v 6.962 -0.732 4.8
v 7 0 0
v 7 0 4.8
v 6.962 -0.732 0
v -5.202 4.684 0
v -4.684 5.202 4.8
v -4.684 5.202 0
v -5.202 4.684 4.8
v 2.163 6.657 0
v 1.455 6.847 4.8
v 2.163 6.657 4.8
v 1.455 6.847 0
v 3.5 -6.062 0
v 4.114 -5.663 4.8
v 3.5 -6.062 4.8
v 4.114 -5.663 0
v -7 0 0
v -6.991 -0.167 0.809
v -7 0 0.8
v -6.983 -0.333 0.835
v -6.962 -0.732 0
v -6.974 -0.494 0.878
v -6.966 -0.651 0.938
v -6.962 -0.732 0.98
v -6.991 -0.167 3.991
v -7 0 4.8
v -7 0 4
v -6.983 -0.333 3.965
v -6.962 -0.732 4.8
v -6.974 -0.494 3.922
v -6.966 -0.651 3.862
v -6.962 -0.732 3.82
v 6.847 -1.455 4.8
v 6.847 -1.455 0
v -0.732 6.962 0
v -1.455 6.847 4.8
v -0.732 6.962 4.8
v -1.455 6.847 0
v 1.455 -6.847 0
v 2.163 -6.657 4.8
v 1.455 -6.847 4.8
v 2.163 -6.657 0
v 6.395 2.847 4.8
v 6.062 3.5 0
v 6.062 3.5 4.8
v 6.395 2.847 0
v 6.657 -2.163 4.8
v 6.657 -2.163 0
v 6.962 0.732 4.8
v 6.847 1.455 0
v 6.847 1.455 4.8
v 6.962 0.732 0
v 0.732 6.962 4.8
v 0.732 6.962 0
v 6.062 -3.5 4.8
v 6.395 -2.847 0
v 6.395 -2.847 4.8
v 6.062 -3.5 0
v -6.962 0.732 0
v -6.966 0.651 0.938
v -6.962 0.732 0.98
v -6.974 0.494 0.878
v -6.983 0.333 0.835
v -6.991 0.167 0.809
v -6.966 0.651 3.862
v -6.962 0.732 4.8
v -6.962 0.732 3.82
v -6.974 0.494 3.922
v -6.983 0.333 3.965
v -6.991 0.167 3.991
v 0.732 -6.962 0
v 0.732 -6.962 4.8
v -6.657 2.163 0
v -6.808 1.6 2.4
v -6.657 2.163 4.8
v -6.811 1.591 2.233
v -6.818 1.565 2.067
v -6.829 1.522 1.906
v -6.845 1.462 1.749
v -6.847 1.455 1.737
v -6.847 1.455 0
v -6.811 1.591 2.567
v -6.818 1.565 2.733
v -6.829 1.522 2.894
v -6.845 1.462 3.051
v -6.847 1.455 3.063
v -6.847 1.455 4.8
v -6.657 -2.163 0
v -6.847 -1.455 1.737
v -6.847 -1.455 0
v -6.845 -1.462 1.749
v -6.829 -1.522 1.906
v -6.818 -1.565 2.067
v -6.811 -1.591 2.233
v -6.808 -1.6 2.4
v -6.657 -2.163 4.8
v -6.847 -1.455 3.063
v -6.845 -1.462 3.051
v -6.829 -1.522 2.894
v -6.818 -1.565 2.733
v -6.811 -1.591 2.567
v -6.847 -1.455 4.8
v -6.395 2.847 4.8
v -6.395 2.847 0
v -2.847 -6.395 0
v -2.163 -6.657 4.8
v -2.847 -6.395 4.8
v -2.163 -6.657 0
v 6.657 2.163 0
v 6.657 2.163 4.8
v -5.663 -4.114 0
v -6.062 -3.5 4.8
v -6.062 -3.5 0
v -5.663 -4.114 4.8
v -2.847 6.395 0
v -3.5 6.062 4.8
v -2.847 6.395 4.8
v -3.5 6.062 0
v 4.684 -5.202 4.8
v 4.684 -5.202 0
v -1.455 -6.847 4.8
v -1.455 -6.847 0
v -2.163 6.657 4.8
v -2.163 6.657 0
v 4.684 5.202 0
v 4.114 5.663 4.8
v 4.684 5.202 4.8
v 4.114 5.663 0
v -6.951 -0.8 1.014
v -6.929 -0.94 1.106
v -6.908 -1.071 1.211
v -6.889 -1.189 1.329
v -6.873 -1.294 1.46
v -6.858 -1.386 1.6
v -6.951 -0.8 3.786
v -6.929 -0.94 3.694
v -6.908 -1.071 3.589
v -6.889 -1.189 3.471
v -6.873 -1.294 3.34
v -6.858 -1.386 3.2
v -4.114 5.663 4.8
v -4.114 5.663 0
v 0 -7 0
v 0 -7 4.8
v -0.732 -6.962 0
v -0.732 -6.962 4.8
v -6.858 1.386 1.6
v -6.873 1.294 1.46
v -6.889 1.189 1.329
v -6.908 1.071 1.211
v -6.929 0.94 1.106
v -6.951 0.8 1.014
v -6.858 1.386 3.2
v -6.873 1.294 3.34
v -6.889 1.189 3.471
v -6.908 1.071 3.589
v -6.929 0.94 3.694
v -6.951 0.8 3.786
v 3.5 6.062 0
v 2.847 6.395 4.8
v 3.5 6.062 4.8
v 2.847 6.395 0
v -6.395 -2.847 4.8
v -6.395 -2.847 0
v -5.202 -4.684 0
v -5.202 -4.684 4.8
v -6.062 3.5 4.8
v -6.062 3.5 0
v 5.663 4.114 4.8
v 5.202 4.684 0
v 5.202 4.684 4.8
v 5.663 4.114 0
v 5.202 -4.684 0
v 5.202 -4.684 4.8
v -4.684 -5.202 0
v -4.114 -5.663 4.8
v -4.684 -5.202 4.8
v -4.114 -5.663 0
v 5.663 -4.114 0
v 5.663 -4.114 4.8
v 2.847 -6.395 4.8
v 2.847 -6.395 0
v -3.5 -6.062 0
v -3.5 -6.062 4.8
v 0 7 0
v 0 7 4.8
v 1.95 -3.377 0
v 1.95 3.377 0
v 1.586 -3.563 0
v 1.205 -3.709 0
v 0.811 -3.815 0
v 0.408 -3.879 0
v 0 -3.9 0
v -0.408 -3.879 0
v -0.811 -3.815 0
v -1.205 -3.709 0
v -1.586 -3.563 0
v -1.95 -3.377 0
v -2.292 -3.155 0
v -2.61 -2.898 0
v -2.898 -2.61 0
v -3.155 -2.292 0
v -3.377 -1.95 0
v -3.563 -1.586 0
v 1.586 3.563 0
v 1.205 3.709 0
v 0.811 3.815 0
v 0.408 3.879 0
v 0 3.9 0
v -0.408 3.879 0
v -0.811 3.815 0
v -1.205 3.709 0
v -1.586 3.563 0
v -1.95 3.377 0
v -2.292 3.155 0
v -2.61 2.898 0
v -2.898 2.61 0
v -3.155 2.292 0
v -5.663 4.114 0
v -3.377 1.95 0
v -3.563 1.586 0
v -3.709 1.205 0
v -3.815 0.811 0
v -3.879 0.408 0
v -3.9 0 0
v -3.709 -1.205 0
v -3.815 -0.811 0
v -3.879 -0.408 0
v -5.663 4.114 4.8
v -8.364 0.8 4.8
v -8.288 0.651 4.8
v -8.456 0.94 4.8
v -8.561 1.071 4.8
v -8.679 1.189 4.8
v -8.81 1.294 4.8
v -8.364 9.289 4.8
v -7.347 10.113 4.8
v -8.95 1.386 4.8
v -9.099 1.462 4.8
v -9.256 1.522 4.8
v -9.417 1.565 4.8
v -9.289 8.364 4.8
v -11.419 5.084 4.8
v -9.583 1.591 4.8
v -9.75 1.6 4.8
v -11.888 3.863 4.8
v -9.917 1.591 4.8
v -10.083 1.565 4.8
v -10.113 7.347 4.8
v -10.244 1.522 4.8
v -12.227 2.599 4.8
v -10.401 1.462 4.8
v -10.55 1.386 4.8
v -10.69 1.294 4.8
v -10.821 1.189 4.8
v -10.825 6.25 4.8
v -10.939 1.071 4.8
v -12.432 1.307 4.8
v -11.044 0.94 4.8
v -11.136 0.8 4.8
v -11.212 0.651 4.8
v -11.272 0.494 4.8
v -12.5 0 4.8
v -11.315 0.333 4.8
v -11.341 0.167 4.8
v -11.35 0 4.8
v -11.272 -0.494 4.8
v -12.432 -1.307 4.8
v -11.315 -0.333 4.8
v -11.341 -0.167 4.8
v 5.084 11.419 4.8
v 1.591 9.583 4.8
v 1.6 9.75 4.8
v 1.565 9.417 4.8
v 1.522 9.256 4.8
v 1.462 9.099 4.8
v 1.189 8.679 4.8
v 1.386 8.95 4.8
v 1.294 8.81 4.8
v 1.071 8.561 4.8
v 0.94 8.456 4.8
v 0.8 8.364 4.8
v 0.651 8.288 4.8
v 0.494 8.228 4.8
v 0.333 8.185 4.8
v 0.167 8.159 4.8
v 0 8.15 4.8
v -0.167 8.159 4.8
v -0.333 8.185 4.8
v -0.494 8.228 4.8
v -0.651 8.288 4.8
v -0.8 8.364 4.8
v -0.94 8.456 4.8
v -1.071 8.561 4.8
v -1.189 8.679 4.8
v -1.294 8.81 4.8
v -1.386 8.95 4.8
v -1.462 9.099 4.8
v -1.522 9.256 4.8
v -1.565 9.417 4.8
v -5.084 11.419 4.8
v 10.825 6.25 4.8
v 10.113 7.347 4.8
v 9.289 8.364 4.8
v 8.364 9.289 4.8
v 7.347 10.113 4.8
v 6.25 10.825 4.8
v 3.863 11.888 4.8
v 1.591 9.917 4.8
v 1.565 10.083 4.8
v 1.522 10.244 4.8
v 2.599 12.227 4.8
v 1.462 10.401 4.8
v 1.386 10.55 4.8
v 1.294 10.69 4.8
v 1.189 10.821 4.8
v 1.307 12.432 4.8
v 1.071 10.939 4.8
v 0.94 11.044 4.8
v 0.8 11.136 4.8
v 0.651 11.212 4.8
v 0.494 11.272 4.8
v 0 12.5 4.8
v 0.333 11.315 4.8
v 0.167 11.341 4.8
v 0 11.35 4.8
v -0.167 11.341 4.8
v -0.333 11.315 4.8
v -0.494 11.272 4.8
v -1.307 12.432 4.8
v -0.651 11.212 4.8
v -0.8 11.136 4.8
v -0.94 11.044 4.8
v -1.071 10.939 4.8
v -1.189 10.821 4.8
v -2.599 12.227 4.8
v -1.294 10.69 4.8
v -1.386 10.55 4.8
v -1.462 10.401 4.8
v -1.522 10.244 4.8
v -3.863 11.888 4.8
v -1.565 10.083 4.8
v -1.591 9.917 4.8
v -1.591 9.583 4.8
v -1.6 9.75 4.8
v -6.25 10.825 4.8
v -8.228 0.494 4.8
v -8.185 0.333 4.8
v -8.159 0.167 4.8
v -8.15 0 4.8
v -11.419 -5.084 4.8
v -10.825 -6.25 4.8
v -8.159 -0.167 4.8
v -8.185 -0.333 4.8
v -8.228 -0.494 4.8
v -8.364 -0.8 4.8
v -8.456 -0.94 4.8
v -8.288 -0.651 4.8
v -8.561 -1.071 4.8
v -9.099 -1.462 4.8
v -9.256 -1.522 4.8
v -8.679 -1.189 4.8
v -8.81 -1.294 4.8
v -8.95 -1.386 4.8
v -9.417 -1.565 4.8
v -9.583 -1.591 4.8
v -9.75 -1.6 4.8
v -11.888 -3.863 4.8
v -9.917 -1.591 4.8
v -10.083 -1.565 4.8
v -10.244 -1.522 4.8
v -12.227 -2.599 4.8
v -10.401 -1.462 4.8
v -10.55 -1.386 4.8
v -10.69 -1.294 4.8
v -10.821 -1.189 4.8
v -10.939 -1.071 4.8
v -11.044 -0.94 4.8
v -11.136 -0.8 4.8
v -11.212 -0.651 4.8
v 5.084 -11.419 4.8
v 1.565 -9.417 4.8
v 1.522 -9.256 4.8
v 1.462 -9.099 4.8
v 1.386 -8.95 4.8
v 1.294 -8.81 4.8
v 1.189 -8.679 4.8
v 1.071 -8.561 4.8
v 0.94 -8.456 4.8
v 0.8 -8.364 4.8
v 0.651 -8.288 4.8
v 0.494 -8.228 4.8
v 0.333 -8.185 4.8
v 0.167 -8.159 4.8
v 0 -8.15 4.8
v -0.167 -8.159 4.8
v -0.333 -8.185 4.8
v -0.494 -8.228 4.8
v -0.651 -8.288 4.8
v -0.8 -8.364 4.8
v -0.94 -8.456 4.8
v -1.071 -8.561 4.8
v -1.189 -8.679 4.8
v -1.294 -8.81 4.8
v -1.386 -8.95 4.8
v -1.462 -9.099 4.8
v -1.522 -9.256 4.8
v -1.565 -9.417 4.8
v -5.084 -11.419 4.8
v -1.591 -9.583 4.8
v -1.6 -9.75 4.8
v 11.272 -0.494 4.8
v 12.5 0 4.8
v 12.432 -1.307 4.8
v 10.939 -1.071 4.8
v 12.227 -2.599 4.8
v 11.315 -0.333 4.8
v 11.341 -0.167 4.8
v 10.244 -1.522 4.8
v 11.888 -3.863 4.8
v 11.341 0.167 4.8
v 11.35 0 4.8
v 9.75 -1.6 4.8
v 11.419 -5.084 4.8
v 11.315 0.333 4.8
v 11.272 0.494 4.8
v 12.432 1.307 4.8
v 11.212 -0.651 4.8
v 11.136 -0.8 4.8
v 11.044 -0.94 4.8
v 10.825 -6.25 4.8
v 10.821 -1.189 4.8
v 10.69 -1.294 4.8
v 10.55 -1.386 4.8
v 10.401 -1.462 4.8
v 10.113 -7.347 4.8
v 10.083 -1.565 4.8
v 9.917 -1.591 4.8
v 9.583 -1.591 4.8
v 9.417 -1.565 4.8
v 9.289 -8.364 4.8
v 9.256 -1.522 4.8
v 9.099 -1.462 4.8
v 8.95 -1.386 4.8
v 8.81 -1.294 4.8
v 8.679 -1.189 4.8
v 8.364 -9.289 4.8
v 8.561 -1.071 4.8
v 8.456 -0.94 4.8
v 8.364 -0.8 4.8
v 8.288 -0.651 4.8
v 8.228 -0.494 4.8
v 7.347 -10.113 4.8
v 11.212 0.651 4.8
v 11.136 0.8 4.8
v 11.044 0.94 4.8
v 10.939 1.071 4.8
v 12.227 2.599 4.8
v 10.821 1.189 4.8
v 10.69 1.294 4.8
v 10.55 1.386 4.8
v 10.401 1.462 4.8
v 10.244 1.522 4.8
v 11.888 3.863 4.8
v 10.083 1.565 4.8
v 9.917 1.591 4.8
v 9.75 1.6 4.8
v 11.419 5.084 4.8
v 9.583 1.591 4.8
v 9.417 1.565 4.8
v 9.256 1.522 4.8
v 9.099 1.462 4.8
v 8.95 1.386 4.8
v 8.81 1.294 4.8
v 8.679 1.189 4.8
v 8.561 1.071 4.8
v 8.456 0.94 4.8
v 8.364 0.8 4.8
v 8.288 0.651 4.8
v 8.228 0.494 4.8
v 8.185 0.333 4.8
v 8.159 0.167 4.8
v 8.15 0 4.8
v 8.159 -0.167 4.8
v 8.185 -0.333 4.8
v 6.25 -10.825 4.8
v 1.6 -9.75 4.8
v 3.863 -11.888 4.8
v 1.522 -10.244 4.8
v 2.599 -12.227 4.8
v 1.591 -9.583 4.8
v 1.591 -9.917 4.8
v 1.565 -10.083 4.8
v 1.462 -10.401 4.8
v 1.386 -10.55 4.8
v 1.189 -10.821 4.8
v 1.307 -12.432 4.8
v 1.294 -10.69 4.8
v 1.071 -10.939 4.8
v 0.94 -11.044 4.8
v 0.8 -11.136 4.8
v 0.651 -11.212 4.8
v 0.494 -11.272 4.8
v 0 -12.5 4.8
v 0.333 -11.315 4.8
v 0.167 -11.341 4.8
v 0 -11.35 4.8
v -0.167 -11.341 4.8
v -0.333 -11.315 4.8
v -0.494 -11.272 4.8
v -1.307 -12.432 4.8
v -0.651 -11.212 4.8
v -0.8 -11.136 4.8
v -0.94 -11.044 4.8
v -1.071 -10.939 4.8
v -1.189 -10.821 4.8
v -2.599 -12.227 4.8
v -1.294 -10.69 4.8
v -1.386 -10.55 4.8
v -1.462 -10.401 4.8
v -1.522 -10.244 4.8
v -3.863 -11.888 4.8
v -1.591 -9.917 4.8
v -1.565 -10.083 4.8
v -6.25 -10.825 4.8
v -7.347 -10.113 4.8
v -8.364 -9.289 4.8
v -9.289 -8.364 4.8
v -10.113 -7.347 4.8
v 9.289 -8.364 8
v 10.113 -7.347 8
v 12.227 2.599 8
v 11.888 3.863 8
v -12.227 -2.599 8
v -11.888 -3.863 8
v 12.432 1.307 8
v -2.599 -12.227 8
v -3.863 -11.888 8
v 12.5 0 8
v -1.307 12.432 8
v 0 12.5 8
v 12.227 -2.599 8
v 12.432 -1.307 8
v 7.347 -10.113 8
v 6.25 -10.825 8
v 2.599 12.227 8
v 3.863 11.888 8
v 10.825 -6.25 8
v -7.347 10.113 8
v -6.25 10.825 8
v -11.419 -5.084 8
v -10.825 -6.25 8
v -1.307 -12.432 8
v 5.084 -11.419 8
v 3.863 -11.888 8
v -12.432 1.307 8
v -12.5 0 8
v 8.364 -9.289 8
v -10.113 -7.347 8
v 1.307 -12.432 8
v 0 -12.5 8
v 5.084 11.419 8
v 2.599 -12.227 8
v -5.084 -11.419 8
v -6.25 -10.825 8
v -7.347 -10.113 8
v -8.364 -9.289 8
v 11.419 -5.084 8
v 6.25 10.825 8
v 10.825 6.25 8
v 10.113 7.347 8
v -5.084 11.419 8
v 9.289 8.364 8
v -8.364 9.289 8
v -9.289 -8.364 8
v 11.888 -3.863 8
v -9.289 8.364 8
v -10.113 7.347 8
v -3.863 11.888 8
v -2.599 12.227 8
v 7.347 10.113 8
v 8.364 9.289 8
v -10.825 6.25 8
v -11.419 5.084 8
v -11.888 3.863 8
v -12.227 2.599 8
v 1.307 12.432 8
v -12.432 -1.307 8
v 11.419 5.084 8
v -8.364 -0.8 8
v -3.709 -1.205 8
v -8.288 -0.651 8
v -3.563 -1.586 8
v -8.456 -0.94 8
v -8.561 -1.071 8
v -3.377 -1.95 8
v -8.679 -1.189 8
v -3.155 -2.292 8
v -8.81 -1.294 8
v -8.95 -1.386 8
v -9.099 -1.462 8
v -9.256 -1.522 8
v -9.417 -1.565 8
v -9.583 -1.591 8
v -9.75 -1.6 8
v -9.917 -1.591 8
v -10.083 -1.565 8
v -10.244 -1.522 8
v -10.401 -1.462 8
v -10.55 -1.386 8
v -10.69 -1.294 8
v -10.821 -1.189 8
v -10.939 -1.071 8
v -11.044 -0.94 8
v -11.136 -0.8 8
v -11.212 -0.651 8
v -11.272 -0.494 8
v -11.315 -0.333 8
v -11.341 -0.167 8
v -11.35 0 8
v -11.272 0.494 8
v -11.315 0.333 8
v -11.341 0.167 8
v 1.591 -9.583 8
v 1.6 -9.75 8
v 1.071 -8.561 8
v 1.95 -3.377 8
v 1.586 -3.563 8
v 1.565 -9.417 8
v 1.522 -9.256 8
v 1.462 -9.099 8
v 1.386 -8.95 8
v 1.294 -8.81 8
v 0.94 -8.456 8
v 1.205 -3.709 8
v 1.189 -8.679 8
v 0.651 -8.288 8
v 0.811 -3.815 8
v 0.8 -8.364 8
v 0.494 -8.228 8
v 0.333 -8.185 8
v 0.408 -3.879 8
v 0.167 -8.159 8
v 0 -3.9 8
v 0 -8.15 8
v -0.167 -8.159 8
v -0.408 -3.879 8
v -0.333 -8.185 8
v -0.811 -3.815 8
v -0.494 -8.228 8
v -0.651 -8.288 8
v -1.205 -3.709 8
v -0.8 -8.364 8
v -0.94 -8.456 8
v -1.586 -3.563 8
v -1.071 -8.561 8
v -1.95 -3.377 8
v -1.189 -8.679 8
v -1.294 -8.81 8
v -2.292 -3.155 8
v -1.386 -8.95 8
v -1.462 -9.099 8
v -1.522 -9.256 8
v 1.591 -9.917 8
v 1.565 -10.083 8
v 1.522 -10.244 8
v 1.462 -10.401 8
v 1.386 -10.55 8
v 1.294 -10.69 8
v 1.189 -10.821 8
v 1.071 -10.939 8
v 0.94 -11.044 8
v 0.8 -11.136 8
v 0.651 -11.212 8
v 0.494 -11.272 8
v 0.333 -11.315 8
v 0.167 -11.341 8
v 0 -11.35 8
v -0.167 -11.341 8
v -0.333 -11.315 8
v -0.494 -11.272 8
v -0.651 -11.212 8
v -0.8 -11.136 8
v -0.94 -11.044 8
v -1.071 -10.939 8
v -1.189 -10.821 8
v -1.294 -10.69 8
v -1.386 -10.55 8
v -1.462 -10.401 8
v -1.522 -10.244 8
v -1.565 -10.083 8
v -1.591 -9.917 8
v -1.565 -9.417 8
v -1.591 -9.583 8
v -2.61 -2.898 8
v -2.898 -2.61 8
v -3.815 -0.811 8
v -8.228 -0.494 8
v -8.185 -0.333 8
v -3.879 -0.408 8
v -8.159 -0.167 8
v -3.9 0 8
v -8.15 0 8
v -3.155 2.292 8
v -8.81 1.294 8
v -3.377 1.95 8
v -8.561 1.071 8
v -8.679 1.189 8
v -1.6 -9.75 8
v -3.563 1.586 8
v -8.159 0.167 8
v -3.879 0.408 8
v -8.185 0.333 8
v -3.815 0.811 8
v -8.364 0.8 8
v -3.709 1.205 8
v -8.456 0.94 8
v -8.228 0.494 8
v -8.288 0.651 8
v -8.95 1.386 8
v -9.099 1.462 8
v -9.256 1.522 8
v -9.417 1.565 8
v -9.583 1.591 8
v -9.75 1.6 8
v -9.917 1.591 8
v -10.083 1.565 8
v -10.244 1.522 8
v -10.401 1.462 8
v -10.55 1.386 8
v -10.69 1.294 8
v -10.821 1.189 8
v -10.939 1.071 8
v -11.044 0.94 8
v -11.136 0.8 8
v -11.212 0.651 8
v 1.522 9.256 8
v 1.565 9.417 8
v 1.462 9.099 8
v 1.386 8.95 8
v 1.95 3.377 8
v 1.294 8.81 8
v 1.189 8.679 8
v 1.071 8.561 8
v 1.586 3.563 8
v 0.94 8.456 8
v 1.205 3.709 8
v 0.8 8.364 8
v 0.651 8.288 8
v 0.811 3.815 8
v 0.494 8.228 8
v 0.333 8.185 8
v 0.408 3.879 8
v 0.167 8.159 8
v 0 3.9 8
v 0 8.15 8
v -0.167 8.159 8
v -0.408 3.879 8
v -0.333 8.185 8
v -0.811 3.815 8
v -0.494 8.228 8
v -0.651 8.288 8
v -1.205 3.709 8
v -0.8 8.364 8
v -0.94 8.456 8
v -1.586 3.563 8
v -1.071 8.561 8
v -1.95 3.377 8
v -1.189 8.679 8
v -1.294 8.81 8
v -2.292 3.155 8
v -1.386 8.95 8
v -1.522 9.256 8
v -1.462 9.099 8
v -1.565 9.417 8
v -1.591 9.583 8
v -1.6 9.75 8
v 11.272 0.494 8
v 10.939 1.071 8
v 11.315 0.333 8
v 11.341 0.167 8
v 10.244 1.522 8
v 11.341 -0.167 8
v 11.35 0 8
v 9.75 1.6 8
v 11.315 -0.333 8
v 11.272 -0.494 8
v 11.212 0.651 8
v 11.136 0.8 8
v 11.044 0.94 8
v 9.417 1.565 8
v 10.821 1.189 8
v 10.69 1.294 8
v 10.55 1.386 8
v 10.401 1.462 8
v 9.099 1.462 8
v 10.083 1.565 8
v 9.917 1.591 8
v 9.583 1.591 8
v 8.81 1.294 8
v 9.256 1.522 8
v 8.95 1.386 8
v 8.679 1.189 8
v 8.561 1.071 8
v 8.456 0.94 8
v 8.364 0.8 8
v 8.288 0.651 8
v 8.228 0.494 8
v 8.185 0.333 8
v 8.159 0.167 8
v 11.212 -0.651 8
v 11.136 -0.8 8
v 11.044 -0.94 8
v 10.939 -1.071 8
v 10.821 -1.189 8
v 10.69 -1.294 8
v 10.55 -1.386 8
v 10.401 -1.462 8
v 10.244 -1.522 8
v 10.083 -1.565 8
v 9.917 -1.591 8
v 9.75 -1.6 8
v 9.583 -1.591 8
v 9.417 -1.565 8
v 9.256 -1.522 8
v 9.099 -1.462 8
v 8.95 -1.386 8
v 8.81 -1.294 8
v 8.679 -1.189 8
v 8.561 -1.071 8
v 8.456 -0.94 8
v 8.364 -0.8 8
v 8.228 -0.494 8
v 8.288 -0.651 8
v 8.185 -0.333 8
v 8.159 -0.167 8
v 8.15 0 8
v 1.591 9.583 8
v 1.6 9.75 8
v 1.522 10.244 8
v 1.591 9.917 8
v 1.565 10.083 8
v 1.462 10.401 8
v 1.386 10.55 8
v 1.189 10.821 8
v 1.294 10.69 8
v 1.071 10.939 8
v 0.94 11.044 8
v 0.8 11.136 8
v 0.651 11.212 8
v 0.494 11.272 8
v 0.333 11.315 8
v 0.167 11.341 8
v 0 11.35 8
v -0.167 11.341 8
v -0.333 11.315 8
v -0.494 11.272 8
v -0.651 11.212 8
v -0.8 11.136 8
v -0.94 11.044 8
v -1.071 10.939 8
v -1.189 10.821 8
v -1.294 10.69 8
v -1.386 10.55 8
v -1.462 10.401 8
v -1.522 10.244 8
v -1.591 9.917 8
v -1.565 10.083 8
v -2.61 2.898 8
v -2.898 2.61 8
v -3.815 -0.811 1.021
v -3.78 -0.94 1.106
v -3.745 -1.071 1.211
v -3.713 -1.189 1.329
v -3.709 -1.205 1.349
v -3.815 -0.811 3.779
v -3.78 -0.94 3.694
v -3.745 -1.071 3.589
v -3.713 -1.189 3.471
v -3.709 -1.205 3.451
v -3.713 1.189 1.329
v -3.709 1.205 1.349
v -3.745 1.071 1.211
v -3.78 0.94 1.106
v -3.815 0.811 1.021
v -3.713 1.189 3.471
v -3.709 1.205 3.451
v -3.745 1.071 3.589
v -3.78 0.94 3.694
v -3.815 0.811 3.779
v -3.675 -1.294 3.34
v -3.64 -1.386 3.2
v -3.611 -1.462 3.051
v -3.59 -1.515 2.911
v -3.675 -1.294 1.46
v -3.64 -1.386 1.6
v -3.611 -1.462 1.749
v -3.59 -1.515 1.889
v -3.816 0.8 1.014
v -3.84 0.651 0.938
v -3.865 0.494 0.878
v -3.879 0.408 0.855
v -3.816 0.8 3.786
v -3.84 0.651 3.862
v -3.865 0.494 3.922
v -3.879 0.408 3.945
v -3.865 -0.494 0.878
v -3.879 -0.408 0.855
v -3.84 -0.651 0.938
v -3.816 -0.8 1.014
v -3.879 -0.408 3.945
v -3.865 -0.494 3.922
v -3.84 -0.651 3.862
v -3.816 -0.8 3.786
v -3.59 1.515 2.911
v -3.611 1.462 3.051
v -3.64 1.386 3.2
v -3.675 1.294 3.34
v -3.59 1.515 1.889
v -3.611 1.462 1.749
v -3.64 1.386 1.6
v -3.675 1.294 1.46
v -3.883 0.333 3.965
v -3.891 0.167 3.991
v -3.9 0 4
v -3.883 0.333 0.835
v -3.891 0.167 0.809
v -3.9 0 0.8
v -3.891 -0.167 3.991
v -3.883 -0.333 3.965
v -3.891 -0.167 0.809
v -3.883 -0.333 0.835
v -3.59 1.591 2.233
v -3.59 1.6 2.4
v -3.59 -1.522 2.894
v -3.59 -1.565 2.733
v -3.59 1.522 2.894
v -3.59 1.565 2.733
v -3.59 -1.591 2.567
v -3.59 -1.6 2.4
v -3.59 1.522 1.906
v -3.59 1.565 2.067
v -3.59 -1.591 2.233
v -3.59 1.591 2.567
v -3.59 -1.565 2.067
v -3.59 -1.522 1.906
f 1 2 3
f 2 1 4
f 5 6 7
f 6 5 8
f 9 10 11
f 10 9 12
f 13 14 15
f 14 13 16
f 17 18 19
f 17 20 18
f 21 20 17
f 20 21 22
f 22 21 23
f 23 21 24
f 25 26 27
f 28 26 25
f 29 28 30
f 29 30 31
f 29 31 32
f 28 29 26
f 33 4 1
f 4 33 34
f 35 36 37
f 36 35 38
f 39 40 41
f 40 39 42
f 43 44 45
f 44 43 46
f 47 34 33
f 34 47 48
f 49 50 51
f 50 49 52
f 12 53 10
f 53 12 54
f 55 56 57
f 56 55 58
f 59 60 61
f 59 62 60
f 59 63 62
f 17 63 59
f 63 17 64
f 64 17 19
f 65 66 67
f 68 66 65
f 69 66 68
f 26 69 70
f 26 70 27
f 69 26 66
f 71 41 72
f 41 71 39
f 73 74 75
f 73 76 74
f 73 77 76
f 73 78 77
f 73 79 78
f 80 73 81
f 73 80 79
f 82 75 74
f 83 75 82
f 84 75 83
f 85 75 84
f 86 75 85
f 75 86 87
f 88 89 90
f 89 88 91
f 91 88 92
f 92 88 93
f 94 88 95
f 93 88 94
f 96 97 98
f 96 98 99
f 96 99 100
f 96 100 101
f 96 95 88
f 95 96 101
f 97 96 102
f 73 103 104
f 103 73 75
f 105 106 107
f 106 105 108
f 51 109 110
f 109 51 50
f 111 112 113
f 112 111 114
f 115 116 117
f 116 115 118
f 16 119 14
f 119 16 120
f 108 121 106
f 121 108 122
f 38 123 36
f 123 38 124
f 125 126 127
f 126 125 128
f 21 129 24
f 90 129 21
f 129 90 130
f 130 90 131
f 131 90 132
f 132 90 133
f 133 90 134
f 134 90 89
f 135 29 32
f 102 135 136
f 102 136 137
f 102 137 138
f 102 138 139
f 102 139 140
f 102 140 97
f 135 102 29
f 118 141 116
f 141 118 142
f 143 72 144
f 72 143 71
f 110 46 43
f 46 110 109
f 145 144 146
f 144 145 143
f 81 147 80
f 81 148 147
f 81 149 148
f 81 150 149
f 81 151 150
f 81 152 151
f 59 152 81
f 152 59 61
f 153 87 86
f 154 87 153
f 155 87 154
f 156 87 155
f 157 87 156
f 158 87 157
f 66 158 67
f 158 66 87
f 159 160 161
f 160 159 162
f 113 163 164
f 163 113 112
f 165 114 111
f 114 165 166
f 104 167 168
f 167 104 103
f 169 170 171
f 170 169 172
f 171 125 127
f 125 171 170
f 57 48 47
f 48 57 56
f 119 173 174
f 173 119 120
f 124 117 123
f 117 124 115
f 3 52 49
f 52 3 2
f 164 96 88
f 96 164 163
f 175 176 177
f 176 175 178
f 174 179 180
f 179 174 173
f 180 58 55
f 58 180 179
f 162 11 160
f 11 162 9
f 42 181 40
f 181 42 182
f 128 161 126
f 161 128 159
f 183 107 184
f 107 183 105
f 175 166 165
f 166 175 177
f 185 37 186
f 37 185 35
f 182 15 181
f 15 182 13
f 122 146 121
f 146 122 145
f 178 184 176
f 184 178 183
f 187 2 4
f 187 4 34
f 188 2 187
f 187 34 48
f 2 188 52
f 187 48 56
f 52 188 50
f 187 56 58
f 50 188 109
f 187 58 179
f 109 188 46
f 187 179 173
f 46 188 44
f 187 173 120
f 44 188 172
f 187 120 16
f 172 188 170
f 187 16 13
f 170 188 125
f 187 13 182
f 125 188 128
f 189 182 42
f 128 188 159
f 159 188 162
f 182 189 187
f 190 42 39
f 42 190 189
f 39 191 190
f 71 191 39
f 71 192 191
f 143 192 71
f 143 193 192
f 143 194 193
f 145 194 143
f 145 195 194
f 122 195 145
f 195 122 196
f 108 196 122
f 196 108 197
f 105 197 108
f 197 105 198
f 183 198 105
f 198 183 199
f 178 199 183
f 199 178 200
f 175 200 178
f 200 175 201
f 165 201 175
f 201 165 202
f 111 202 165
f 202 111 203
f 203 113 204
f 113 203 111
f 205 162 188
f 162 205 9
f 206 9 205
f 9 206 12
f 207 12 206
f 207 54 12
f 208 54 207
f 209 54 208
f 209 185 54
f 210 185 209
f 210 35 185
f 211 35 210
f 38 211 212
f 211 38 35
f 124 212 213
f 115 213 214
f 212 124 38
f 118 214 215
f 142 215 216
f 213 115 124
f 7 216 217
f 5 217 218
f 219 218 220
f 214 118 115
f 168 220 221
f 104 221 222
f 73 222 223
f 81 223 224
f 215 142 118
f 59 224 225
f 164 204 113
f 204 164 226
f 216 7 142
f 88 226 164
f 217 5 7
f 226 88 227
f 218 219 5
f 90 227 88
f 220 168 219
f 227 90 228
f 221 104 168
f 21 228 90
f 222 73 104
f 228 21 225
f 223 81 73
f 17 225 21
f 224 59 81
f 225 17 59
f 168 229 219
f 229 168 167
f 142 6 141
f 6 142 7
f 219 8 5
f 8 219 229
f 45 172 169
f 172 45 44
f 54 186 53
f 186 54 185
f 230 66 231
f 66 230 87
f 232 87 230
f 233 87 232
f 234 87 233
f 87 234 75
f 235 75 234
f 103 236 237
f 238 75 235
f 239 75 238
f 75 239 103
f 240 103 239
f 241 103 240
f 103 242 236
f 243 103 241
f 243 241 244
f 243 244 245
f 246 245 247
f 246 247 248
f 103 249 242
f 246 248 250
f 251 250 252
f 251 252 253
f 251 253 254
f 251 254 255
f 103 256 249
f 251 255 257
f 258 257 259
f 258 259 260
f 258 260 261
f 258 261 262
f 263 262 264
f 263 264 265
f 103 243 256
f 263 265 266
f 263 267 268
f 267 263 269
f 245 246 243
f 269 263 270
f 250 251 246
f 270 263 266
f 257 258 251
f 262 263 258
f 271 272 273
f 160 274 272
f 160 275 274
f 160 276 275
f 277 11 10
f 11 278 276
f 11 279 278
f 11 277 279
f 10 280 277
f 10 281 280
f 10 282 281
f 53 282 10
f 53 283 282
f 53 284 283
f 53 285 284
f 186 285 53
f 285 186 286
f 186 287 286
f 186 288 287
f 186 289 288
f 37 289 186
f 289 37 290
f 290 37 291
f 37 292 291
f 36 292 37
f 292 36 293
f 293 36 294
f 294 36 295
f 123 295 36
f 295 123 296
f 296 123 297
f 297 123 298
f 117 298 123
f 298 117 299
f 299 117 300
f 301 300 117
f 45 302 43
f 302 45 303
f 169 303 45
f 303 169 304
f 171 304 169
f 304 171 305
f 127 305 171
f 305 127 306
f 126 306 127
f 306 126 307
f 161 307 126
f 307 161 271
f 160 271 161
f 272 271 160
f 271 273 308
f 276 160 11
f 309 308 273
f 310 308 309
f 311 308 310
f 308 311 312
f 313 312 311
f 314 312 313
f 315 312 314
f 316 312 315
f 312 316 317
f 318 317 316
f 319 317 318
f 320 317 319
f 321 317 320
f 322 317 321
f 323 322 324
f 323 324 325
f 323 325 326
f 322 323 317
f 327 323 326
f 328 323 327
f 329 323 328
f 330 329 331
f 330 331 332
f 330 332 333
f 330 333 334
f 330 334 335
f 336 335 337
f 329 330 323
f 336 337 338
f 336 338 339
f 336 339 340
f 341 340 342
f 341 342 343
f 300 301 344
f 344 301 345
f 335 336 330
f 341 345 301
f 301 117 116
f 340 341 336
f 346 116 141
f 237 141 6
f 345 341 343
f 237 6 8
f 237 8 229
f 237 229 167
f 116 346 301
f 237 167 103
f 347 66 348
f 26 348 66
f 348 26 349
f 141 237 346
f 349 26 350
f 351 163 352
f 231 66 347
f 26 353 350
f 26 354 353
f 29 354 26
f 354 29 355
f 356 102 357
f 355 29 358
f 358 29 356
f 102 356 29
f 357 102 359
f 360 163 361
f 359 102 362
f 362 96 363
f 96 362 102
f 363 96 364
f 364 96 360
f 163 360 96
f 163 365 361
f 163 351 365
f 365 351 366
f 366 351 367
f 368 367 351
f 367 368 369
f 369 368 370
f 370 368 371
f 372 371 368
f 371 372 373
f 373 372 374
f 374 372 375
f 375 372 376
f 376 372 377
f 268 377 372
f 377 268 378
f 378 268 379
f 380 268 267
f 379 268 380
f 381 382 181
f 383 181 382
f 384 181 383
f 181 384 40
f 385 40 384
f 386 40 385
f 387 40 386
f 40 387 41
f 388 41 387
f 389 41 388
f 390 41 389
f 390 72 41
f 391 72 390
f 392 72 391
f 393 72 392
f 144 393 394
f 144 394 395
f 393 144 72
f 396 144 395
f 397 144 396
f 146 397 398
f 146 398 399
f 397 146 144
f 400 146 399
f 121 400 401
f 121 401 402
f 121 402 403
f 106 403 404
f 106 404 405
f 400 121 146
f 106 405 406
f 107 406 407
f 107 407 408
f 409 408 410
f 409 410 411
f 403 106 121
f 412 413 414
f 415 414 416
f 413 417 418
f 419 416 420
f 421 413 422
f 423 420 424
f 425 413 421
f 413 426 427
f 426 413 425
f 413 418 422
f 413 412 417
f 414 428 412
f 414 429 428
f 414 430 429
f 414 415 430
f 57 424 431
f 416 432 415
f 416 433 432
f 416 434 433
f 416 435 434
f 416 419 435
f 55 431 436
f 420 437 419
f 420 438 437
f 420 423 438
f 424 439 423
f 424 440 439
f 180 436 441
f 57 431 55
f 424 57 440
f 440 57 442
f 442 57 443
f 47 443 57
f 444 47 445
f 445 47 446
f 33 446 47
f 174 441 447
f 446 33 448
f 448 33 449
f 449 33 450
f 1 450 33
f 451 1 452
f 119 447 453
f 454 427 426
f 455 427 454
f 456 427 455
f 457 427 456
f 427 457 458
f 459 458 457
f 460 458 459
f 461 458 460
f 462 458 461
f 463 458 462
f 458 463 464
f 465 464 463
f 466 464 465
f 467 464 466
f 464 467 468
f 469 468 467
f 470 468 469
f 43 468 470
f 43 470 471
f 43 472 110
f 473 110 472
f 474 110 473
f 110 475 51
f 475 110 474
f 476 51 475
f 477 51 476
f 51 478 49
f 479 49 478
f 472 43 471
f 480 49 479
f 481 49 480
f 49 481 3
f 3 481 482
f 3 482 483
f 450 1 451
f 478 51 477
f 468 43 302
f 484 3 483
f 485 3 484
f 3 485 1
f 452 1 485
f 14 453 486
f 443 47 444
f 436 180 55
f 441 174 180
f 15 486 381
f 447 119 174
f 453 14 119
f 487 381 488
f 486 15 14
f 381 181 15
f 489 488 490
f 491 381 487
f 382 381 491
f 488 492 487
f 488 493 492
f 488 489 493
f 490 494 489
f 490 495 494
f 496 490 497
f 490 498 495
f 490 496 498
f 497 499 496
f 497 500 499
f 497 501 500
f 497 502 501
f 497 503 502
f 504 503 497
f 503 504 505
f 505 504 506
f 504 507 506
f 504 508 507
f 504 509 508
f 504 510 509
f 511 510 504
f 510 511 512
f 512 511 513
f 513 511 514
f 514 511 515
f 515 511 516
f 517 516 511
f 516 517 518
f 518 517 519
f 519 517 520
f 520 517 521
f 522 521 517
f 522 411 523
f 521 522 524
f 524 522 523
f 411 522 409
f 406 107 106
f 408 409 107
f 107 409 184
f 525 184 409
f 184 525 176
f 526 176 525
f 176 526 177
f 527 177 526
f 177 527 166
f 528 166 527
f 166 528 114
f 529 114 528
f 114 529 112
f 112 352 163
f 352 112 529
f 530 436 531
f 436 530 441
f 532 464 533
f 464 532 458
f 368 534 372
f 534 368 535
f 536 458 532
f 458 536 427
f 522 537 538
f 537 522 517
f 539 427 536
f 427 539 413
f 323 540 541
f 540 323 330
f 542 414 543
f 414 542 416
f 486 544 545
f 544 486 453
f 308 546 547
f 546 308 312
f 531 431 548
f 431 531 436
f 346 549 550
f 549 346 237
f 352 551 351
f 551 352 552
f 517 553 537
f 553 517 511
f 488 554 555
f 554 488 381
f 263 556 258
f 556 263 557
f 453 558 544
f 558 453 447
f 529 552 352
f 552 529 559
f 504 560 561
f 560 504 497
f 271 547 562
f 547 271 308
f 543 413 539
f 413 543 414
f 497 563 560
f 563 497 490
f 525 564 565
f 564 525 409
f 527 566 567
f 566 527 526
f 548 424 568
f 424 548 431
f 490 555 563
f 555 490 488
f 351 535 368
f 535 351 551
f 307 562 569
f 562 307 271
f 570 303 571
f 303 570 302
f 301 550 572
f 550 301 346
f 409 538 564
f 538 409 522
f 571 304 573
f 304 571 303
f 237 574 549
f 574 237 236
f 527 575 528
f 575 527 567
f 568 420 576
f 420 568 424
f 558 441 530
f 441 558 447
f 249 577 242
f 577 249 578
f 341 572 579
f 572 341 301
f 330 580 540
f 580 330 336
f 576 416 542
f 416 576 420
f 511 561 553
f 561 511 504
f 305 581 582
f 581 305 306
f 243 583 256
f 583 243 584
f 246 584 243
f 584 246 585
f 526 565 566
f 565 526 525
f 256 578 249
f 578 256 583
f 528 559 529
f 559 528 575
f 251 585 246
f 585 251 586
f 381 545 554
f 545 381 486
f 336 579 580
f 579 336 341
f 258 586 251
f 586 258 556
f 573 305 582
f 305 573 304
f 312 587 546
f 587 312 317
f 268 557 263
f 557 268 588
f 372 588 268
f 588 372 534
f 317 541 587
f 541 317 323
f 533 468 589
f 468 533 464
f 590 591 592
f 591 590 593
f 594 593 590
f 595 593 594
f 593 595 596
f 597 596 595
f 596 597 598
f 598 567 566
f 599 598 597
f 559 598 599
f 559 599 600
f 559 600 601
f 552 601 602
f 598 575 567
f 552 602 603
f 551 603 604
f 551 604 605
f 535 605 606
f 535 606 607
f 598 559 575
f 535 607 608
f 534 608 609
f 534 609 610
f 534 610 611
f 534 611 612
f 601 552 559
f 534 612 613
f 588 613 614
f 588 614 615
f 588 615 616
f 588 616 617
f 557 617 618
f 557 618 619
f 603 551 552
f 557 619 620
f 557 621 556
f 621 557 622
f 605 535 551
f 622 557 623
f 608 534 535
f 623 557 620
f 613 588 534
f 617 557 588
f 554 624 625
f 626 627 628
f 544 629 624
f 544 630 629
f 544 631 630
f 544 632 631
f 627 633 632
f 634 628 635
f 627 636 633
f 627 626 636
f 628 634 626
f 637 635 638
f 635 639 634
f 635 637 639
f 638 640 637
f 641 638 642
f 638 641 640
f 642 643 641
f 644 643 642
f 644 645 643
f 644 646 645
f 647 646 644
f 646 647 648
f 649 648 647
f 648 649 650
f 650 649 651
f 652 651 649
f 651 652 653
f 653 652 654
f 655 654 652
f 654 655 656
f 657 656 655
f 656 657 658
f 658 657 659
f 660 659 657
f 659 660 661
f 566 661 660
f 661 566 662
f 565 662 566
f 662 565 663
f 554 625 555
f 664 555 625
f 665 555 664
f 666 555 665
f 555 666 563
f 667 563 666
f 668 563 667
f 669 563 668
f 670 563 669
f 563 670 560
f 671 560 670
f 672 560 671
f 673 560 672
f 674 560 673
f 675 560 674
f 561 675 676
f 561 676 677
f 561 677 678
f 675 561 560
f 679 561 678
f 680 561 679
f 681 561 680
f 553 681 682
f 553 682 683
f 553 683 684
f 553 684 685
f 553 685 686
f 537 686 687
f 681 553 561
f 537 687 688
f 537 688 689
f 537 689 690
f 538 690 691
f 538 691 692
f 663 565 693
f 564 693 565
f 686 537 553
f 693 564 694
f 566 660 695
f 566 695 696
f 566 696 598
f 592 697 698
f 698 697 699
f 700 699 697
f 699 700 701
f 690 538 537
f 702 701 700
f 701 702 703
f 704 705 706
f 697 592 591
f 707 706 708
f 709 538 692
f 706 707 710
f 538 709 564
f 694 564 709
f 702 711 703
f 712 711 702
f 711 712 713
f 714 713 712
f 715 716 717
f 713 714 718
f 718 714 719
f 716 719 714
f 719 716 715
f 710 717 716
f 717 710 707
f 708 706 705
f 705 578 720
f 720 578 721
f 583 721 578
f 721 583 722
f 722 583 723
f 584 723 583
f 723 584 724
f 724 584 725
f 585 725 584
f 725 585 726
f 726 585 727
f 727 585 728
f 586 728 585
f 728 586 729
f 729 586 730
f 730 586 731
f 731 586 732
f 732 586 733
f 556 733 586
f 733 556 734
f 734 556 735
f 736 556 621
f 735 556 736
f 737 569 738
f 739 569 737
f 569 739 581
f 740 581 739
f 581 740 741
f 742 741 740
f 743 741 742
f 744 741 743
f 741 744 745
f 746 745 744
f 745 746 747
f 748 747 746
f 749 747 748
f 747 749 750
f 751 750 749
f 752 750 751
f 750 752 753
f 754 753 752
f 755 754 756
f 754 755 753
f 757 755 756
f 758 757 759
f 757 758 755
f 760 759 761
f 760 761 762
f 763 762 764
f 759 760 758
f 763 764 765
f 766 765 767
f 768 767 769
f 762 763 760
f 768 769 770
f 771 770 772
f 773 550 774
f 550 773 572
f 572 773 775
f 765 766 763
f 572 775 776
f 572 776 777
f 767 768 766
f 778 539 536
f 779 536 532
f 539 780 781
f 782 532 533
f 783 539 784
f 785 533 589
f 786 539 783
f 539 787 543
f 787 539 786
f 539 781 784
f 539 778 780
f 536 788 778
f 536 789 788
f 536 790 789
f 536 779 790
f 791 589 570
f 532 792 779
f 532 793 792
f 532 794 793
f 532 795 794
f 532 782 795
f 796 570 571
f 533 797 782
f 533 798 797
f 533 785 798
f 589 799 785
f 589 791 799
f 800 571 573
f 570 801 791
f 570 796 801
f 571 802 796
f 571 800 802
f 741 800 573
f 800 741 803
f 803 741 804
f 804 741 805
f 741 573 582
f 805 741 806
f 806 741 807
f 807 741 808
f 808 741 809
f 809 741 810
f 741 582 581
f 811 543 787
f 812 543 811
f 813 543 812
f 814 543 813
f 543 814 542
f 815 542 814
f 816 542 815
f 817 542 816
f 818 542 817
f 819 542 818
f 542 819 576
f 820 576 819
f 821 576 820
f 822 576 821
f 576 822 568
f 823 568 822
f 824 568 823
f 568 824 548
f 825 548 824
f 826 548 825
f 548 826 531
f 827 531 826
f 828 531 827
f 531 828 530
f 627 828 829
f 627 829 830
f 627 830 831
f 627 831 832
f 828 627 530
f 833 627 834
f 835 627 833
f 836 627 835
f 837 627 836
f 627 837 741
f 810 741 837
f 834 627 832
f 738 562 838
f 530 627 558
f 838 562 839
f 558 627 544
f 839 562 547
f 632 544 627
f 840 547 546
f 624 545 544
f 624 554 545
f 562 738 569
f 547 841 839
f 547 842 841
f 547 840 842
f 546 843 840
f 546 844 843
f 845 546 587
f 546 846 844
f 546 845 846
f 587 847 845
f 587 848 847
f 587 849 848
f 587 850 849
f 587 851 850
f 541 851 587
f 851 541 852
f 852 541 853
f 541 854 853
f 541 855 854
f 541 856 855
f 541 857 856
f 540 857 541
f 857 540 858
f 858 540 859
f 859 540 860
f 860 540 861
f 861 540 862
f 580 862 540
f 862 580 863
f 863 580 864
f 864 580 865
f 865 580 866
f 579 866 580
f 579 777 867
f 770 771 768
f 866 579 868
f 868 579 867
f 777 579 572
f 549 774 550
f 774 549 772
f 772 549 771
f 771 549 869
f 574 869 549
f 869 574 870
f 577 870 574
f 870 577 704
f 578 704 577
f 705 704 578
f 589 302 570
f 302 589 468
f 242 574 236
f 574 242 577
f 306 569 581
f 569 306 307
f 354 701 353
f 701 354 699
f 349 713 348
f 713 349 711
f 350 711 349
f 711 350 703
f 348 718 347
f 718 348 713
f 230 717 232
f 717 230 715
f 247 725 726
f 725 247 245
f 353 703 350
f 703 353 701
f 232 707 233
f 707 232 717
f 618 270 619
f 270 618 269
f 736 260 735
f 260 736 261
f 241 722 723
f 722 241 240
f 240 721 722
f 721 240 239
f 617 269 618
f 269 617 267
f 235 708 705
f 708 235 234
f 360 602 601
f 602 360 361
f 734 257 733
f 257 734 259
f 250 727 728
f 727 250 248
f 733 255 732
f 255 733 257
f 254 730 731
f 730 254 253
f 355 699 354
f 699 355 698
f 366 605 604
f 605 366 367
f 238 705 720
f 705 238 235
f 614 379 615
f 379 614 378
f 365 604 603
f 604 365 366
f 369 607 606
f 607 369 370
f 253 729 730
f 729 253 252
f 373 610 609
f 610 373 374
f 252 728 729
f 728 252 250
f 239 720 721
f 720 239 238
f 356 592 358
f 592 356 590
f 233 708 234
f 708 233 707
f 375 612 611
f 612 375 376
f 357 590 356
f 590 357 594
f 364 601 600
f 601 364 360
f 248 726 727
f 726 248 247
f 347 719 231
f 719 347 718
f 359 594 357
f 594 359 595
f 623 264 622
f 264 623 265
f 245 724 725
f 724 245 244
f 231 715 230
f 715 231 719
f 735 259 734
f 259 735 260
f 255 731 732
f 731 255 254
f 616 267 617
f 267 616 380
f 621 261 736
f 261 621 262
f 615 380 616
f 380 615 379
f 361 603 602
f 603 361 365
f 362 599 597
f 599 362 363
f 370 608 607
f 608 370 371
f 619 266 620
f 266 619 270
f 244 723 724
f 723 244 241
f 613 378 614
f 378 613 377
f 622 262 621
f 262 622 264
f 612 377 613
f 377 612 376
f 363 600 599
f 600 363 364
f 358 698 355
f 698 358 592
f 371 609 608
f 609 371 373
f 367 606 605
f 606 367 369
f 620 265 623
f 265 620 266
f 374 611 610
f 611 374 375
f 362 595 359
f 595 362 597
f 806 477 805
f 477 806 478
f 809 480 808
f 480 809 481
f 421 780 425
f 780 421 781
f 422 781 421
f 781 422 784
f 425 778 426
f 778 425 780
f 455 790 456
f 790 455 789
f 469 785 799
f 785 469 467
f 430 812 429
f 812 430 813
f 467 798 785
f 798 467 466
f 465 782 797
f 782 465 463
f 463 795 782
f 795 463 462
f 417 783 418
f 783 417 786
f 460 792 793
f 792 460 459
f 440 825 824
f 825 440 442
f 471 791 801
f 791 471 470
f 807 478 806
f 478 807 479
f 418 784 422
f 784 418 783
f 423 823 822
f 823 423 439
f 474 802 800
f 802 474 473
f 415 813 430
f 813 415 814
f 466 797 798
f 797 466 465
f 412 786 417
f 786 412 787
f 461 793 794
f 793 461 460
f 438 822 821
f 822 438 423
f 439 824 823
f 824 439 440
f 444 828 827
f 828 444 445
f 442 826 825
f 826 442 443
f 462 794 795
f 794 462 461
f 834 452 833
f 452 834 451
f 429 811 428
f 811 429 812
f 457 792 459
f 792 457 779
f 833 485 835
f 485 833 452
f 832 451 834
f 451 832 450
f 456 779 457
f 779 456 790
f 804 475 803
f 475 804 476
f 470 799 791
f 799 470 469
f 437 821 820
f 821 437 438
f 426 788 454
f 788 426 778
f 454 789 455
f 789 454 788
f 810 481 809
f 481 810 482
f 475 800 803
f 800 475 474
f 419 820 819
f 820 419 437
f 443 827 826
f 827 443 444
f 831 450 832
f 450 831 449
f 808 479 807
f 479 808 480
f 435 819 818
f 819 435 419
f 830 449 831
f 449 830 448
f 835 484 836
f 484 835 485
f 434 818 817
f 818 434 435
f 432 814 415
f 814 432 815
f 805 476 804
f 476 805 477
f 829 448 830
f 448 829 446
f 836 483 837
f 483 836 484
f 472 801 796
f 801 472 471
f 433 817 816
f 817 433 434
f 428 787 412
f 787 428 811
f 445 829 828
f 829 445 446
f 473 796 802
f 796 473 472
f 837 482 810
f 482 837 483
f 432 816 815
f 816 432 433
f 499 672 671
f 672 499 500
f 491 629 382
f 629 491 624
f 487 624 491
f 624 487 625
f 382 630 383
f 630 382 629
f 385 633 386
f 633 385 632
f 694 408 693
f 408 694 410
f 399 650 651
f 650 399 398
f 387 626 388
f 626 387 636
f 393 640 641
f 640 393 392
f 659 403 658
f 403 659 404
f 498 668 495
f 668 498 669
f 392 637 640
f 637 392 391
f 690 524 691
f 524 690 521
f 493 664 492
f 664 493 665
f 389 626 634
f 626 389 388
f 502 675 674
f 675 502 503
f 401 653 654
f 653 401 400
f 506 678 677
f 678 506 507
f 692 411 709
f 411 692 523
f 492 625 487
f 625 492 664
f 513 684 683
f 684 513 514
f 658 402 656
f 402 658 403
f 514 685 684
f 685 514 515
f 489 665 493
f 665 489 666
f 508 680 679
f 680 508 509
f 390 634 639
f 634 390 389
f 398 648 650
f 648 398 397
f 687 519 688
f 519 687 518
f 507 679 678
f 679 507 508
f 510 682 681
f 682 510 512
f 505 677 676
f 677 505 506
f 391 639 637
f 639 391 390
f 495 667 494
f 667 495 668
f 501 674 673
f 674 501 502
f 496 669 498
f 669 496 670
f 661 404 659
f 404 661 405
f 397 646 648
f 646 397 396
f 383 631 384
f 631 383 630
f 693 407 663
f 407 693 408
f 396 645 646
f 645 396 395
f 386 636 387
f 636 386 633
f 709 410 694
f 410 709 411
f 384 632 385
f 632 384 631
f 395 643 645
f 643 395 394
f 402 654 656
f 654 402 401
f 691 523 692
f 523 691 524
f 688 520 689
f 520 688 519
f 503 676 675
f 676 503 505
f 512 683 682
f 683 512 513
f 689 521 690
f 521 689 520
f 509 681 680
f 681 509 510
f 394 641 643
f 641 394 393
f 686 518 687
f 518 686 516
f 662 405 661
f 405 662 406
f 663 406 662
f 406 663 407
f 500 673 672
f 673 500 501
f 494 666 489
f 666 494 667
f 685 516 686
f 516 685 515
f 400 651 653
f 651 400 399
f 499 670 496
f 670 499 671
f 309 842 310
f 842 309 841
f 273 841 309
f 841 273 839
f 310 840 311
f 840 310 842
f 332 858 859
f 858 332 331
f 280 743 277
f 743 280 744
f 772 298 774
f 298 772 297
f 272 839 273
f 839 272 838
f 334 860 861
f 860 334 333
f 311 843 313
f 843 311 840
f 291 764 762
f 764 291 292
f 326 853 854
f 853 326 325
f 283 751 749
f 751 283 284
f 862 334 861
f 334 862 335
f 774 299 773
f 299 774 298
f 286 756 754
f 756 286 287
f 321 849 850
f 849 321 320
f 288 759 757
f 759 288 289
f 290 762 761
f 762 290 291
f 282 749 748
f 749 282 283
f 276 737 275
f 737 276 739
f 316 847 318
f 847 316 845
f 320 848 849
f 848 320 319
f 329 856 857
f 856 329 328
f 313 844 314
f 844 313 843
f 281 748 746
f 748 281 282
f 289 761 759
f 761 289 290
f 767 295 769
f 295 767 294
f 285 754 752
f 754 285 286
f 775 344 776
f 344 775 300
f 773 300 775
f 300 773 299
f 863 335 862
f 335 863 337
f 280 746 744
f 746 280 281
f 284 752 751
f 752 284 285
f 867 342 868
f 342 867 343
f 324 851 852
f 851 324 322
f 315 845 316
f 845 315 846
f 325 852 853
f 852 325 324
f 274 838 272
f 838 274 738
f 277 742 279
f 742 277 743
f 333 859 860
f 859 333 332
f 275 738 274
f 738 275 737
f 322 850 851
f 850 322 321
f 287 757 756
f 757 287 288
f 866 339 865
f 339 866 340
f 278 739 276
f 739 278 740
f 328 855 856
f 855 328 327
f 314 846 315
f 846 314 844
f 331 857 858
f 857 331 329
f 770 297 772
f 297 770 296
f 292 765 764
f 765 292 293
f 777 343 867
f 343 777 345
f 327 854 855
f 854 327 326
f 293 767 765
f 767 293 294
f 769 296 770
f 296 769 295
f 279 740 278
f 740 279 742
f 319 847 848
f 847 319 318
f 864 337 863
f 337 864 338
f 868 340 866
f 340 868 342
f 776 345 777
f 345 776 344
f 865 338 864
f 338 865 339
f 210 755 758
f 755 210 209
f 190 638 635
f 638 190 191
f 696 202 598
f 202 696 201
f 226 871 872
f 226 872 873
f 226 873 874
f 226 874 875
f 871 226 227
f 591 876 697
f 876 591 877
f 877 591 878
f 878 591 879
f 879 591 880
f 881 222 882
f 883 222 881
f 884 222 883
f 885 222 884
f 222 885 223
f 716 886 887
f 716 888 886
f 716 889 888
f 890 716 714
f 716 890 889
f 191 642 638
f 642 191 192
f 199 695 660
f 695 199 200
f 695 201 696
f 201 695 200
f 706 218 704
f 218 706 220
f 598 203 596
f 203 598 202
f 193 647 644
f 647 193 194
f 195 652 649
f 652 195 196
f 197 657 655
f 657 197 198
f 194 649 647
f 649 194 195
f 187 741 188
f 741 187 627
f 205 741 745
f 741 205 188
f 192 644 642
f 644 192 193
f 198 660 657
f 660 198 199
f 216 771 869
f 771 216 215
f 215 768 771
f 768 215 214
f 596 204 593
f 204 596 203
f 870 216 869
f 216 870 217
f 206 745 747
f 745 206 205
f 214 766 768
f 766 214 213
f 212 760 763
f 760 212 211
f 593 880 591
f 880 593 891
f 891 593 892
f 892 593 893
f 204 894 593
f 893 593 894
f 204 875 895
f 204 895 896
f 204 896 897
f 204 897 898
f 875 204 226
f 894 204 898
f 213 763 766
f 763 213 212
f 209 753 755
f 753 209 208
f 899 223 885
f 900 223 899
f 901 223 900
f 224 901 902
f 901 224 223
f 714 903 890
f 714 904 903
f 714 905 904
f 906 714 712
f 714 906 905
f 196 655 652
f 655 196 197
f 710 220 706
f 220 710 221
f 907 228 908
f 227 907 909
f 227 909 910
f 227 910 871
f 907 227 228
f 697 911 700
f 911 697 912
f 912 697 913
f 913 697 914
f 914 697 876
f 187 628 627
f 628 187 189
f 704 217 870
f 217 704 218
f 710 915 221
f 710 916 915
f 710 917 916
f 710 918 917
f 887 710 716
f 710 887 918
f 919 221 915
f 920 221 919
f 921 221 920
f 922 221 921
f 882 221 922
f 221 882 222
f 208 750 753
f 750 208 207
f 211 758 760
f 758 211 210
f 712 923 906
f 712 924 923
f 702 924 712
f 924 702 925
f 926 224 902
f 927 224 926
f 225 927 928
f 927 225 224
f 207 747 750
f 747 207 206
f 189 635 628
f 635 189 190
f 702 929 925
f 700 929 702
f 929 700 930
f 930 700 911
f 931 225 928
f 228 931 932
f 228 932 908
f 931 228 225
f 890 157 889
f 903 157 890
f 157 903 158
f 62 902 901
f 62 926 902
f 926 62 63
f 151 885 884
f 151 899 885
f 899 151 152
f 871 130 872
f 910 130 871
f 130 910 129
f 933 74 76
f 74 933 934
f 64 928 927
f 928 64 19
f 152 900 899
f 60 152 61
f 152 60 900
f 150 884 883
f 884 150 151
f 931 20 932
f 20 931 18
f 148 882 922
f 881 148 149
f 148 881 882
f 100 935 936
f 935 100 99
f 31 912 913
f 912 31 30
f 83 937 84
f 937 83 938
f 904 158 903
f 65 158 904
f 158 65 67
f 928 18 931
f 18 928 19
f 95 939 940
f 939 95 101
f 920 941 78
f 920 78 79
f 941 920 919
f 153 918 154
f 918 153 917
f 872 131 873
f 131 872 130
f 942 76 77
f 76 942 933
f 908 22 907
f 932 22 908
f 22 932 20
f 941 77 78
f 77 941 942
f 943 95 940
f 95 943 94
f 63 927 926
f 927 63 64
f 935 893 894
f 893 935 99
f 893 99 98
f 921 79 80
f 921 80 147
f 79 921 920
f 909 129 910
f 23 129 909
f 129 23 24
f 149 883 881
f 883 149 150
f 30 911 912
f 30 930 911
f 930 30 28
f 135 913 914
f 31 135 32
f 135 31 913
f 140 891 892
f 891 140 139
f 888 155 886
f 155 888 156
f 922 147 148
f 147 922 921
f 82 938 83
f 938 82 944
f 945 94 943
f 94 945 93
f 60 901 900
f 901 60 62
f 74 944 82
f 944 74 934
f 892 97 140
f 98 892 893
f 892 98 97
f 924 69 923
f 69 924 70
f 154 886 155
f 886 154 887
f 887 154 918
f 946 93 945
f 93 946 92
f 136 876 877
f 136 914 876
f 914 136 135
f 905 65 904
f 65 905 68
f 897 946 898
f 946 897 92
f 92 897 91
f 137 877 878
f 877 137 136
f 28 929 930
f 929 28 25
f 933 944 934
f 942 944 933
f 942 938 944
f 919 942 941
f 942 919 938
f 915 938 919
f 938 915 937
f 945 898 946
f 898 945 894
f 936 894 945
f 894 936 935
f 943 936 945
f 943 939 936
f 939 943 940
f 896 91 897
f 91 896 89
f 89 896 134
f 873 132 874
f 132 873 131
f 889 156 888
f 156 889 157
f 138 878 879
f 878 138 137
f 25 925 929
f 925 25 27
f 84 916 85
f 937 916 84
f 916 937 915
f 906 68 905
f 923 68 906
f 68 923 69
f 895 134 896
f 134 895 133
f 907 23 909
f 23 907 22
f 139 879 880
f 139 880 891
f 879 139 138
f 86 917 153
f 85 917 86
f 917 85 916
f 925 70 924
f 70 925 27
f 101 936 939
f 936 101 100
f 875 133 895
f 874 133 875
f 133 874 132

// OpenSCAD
// file: metric_screw_sizes.scad
//sizes for metric screws that work
m3_clearance = 3.85;
m3_tight = 3.5;
m3_cap_clear = 6;
m3_cap_depth = 3.3;
m3_nut_clear = 7;
m3_nut_depth = 2.3;

// insert hole sizes < diameter of insert
m2_insert = 3.2;
m2_clearance = 2.1;
// main file
// robot wheel for gear motors
$fn = 60;
diameter = 15;
rim_thickness = 2.5;
rim_diameter = 5; // subtracted from total diameter
disc_thickness = 2.5; 

include <metric_screw_sizes.scad>



// 4mm with cutout at 2 works but is sloppy
//union(){
//difference(){
//cylinder(h = rim_thickness, r = diameter/2);
//translate([0,0,disc_thickness])
//    cylinder(h = disc_thickness, r = (diameter-rim_diameter)/2);
//    
//cylinder(h = disc_thickness, r = 3.9); //this size fits perfectly, sliding on with nearly no slop
//}
//translate([(3.9/2), -3.9, 0])
//    cube([3.9, 7.8, disc_thickness]);
//}

module hub(height = 0.32*15, diameter = 14, flange_height = 0.32*10, flange_diameter = 25, axle_radius = 3.9){
    x = [-1, 1, 0, 0];
    y = [0, 0, -1, 1];
    //parameter checks
    hub_thickness = diameter/2 - axle_radius;
    echo("hub thickness: ", hub_thickness);
    echo("total height: ", height+flange_height);
    wheel_screw_radius = diameter/2+(flange_diameter/2 - diameter/2)/2;//flange_diameter/2-m2_insert;
    echo("wheel screw radius: ", wheel_screw_radius);
    difference(){
        //main body
        union(){
            linear_extrude(height = height)
                circle(d = diameter);
            translate([0, 0, height])
            linear_extrude(height = flange_height)
                circle(d = flange_diameter);
        }
        //make axle profile
        linear_extrude(height = height+flange_height)
            difference(){
                circle(r = axle_radius);
                translate([axle_radius/2, -axle_radius, 0])
                square([axle_radius, 2*axle_radius]);
            }
        //set screw
        translate([-diameter/2, 0, 0.5*height])
        rotate([0,90,0])
            #cylinder(h = hub_thickness*1.1, r = m2_insert/2);
        //wheel screws
        for (i = [0:3]){
            translate([x[i]*wheel_screw_radius, y[i]*wheel_screw_radius, height])
                #cylinder(h = flange_height, r = m2_insert/2);
        
    }
}

        
    
}
hub();
